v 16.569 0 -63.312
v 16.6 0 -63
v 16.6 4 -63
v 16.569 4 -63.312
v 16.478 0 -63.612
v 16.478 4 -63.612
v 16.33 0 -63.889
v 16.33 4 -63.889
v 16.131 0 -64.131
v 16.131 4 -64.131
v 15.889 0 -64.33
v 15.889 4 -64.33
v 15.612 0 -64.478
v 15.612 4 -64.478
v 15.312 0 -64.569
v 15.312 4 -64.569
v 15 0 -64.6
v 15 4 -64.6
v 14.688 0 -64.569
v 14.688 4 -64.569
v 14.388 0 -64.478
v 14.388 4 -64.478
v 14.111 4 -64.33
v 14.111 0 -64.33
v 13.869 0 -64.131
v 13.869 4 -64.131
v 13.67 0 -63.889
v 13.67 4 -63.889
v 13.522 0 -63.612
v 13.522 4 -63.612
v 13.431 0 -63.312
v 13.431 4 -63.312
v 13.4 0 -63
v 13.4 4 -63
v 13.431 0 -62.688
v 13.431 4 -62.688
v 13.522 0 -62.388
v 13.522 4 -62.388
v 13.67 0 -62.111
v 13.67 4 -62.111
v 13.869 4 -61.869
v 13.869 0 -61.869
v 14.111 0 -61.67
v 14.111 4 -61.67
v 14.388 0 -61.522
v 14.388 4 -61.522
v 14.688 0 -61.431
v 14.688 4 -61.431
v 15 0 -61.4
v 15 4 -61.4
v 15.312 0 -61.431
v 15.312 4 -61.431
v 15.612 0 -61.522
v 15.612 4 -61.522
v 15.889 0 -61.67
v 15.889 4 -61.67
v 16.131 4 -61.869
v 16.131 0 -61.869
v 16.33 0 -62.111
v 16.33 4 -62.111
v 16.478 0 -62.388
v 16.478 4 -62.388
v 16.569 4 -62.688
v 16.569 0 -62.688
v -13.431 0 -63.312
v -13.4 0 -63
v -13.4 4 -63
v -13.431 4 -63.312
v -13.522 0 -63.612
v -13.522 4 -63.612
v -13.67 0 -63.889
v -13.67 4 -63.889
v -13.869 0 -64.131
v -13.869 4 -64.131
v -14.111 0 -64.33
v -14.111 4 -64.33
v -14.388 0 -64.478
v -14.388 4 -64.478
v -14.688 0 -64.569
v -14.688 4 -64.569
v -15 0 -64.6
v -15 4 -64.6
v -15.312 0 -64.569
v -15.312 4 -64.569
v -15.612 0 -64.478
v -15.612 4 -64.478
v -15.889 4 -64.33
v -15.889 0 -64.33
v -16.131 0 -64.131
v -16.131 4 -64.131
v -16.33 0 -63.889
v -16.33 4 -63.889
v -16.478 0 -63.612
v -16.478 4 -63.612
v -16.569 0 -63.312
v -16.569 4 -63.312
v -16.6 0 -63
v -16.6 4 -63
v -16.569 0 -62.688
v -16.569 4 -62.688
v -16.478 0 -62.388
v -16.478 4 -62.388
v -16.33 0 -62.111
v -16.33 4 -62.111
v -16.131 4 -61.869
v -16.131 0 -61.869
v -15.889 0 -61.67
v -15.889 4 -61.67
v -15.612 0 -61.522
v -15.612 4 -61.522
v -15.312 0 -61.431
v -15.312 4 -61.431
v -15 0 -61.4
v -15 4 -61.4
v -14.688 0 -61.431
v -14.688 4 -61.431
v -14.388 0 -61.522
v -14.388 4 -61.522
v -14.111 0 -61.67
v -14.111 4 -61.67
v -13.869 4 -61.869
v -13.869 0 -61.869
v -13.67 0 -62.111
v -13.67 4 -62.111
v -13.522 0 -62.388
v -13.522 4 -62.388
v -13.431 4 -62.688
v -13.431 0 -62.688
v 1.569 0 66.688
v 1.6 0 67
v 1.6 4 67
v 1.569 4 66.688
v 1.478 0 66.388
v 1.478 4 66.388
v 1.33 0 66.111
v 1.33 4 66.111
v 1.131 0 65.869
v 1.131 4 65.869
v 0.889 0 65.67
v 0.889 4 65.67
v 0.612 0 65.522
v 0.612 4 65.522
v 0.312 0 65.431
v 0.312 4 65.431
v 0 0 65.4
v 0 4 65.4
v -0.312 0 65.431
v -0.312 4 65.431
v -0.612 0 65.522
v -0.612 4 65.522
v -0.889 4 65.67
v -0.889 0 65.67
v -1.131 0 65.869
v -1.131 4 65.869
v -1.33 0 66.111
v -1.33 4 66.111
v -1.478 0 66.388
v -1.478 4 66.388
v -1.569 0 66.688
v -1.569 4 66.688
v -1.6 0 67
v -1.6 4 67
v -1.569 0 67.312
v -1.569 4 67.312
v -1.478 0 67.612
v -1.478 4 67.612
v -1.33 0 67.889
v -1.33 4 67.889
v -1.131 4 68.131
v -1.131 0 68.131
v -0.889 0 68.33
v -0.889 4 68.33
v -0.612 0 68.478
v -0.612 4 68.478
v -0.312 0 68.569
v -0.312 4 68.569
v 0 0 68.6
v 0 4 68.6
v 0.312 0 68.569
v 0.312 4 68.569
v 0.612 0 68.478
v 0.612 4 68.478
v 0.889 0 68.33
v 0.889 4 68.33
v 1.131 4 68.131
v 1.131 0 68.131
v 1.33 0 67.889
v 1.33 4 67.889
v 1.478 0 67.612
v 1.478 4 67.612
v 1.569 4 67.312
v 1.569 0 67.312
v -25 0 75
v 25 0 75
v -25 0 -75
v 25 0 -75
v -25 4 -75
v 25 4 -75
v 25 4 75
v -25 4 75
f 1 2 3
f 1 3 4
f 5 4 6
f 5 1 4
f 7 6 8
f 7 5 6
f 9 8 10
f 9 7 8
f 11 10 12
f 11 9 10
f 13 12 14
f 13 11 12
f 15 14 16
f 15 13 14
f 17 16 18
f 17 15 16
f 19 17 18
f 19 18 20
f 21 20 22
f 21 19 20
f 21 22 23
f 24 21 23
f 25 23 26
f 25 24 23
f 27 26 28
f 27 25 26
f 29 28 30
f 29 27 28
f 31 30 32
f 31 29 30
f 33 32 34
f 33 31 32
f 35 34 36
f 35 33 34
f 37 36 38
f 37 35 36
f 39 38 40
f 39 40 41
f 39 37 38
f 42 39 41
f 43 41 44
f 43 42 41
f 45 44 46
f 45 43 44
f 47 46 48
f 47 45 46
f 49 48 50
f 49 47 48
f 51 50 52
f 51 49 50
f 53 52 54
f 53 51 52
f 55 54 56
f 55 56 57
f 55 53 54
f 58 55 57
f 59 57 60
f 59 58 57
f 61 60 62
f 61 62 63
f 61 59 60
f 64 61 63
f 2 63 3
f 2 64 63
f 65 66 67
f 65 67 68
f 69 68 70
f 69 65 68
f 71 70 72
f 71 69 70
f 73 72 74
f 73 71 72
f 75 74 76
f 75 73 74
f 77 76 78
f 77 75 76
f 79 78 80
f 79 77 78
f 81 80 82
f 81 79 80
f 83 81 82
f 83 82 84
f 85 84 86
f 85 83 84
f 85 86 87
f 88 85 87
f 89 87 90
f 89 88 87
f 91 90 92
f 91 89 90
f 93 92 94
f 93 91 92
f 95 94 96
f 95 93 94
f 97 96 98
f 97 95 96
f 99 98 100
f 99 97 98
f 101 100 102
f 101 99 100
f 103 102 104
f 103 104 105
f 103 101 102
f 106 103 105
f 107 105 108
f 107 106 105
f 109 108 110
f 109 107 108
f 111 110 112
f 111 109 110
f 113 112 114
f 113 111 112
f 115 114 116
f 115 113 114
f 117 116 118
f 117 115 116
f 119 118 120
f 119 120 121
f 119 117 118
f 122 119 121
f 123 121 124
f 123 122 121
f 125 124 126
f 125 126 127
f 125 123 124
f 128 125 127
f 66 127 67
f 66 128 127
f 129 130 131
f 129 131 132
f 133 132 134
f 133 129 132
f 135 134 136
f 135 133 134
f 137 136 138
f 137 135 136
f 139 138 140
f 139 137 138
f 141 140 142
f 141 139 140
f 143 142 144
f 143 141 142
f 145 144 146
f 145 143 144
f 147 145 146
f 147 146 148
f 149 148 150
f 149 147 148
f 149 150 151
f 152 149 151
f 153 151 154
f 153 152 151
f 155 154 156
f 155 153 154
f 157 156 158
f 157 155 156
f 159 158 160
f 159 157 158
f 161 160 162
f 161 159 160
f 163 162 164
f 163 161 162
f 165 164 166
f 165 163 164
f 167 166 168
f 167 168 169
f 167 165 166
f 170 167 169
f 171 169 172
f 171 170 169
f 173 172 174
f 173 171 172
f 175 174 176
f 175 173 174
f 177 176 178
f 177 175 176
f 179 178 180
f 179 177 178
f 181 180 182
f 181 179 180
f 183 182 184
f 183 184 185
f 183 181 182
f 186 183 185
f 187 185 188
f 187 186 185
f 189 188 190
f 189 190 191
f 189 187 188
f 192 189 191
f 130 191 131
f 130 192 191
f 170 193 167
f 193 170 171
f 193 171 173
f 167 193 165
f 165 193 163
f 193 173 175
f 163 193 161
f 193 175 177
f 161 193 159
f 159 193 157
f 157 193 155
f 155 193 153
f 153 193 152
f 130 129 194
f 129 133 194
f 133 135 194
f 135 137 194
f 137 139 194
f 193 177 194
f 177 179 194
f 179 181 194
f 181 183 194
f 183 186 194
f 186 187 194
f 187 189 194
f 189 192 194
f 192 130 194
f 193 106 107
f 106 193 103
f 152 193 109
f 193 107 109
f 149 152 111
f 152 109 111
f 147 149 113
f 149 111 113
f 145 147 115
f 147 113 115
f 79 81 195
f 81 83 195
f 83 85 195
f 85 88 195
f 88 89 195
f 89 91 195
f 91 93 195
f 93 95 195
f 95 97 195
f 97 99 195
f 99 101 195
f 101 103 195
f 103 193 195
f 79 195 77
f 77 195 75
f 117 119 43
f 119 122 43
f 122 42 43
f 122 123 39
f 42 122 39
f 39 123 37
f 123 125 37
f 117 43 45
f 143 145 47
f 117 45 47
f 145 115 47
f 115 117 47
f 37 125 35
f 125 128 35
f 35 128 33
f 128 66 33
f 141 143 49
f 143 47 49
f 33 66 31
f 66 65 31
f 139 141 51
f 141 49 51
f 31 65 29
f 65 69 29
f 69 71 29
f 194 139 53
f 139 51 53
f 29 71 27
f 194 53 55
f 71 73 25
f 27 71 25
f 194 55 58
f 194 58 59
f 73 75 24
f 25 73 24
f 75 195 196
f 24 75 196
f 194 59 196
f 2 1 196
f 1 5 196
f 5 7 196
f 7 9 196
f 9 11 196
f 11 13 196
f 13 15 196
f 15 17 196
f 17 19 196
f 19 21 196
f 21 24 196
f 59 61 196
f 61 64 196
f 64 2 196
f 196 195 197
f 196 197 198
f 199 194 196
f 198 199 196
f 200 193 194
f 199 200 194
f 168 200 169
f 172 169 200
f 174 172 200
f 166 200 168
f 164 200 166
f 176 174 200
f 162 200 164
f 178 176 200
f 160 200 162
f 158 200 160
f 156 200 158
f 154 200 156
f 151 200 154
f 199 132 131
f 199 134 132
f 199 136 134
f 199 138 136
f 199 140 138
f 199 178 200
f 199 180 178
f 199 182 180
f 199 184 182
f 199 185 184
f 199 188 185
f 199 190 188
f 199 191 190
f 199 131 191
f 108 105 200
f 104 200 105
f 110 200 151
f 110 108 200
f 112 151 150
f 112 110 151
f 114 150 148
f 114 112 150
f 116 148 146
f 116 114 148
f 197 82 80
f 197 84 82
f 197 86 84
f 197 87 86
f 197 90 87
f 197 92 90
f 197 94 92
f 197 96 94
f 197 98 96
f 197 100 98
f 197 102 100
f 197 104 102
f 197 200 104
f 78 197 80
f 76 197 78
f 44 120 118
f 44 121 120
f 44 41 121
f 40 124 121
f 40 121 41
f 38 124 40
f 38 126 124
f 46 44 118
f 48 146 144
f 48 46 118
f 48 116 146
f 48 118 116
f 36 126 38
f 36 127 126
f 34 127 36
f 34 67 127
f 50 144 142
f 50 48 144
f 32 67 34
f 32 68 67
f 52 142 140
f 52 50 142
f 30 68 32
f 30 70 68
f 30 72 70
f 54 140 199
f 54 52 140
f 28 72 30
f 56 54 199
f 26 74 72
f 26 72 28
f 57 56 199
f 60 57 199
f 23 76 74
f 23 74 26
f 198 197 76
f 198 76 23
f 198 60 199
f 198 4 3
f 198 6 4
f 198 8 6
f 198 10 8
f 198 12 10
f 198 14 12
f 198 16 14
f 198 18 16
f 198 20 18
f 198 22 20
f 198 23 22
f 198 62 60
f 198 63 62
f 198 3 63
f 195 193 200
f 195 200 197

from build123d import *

# Parameters (mm, degrees)
SKETCH_1_W      = 50
SKETCH_1_H      = 150
SKETCH_1_R      = 1.6
EXTRUDE_1_DEPTH = 4


with BuildPart() as part:
    # 草图1 → 凸台-拉伸1 (new body)
    with BuildSketch(Plane(origin=(0, 0, 0), x_dir=(1, 0, 0), z_dir=(0, 1, 0))):
        Rectangle(SKETCH_1_W, SKETCH_1_H)
        with Locations((-15, 63)):
            Circle(SKETCH_1_R, mode=Mode.SUBTRACT)
        with Locations((15, 63)):
            Circle(SKETCH_1_R, mode=Mode.SUBTRACT)
        with Locations((0, -67)):
            Circle(SKETCH_1_R, mode=Mode.SUBTRACT)
    extrude(amount=EXTRUDE_1_DEPTH)


solid = part.part
